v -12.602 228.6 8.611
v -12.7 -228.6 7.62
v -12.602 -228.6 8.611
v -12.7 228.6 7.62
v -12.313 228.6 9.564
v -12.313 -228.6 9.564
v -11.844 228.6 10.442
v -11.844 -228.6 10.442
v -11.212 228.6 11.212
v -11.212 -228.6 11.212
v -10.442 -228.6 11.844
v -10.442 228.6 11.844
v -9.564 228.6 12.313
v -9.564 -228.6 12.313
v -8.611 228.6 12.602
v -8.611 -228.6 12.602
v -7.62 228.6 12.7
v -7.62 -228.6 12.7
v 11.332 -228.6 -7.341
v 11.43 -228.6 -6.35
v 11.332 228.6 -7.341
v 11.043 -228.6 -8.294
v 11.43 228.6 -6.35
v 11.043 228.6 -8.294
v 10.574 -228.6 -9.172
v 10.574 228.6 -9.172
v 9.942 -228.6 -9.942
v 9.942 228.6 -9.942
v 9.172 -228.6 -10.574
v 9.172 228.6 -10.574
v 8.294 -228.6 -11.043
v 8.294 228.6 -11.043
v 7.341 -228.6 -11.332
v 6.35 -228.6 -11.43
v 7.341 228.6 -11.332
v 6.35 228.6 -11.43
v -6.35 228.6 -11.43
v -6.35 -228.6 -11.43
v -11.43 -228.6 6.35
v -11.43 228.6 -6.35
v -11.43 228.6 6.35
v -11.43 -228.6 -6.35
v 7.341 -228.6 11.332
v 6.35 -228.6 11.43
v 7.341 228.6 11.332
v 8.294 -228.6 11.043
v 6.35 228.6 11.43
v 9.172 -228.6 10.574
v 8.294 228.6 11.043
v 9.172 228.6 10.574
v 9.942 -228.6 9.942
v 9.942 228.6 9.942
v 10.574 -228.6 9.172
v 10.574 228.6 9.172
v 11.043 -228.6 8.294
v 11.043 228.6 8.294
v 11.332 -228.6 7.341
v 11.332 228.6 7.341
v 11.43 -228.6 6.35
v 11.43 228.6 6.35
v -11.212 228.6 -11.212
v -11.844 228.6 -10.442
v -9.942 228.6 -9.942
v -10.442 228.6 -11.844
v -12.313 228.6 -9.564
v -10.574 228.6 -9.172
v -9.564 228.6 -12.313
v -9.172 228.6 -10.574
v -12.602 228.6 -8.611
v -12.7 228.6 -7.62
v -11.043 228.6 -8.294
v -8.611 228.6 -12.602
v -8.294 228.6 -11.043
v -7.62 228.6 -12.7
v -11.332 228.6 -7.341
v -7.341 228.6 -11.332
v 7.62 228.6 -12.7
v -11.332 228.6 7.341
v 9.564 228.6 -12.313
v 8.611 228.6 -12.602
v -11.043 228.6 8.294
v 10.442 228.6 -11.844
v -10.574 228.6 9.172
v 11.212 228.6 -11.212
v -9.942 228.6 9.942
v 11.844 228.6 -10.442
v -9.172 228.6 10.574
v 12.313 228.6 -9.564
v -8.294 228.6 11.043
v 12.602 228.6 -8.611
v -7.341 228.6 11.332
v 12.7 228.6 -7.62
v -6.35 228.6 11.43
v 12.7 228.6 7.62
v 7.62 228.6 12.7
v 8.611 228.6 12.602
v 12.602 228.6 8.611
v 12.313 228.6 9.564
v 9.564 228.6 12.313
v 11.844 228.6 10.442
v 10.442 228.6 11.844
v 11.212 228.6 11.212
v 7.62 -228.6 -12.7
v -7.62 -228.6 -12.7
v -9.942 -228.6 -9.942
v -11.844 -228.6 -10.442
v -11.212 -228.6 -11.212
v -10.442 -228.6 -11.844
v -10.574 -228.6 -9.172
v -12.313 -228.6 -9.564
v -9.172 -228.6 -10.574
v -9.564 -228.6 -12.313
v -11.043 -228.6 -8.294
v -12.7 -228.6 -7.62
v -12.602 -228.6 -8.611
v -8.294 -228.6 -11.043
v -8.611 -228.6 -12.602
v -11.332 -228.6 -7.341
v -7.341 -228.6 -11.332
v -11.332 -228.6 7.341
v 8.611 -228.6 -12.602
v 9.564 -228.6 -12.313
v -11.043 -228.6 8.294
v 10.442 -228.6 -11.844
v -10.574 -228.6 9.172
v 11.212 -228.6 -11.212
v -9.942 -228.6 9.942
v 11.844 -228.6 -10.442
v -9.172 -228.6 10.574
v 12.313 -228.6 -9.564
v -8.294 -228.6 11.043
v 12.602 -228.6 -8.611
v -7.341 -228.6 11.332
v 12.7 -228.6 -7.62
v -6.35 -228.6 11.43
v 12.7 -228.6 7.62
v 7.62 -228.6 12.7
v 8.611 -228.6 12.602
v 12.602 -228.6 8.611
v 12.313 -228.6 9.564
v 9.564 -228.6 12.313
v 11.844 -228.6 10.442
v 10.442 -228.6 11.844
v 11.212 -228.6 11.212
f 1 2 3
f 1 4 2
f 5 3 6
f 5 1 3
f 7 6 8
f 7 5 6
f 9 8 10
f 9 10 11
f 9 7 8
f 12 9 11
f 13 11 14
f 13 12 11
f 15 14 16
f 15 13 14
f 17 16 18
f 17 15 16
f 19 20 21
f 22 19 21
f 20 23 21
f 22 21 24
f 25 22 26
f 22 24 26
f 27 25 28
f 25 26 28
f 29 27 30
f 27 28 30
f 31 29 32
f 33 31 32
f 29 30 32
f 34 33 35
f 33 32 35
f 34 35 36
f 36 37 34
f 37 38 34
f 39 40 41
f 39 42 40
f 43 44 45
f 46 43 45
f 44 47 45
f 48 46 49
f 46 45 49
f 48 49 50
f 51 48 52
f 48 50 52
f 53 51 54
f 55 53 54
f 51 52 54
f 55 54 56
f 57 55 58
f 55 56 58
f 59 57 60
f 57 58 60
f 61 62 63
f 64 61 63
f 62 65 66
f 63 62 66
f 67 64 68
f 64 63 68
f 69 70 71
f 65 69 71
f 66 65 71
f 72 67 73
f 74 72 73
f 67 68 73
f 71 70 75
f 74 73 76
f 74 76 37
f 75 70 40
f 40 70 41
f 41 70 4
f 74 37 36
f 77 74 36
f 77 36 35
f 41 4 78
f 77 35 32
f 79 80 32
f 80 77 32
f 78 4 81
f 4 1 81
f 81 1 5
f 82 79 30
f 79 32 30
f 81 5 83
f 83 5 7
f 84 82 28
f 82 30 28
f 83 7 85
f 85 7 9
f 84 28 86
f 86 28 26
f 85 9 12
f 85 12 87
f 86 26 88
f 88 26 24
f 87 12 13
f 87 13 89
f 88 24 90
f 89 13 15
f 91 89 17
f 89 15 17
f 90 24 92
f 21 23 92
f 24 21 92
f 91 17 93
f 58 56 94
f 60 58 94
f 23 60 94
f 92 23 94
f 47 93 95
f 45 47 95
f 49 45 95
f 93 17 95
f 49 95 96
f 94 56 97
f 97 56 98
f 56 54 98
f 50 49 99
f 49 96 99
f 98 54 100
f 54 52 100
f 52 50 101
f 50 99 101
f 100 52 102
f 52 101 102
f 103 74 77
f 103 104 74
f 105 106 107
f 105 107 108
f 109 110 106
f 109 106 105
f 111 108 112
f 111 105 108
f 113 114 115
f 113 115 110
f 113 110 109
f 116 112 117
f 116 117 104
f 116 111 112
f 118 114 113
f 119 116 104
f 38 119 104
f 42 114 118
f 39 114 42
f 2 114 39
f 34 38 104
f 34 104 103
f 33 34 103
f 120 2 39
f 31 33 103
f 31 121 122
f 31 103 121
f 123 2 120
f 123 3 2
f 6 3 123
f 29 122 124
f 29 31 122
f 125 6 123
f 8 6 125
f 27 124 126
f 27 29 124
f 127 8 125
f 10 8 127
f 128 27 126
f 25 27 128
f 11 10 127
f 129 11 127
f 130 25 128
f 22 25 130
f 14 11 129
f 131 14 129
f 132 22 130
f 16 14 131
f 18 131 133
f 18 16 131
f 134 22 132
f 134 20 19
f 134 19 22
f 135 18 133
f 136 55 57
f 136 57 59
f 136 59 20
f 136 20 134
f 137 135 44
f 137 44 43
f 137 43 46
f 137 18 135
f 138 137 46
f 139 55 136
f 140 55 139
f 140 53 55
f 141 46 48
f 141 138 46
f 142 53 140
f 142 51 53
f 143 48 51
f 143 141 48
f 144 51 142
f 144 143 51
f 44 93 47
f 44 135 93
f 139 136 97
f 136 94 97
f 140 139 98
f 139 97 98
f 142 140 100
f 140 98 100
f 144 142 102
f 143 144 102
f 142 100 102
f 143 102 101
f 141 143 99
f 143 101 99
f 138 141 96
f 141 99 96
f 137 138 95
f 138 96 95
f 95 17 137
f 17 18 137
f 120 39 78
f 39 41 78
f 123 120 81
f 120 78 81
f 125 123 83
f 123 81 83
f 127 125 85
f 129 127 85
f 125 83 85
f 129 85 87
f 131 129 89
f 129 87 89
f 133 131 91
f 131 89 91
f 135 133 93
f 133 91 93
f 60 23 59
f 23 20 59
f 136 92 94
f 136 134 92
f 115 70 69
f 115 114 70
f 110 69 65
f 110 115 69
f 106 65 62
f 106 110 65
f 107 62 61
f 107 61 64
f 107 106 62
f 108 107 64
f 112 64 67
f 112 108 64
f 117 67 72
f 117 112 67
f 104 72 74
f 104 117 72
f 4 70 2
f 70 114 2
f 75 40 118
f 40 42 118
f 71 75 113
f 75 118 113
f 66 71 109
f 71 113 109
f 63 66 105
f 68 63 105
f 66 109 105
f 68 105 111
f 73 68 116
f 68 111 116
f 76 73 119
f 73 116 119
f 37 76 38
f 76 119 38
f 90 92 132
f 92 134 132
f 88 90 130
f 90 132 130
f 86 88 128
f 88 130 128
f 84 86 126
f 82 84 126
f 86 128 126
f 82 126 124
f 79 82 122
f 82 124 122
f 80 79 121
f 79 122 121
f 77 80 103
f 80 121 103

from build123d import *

# Parameters (mm, degrees)
F0_W     = 25.4
F0_H     = 25.4
F0_W_2   = 22.86
F0_H_2   = 22.86
F1_DEPTH = 228.6
F2_R     = 5.08


with BuildPart() as f1:
    # F0 (on Front) → F1 (new body, symmetric)
    with BuildSketch(Plane.XZ):
        Rectangle(F0_W, F0_H)
        Rectangle(F0_W_2, F0_H_2, mode=Mode.SUBTRACT)
    extrude(amount=F1_DEPTH, both=True)

    # F2
    f2_edges = [f1.edges().sort_by_distance(p)[0] for p in [
        (-11.43, 0, 11.43),
        (11.43, 0, 11.43),
        (-11.43, 0, -11.43),
        (11.43, 0, -11.43),
        (-12.7, 0, 12.7),
        (12.7, 0, 12.7),
        (-12.7, 0, -12.7),
        (12.7, 0, -12.7),
    ]]
    fillet(f2_edges, radius=F2_R)


solid = f1.part
